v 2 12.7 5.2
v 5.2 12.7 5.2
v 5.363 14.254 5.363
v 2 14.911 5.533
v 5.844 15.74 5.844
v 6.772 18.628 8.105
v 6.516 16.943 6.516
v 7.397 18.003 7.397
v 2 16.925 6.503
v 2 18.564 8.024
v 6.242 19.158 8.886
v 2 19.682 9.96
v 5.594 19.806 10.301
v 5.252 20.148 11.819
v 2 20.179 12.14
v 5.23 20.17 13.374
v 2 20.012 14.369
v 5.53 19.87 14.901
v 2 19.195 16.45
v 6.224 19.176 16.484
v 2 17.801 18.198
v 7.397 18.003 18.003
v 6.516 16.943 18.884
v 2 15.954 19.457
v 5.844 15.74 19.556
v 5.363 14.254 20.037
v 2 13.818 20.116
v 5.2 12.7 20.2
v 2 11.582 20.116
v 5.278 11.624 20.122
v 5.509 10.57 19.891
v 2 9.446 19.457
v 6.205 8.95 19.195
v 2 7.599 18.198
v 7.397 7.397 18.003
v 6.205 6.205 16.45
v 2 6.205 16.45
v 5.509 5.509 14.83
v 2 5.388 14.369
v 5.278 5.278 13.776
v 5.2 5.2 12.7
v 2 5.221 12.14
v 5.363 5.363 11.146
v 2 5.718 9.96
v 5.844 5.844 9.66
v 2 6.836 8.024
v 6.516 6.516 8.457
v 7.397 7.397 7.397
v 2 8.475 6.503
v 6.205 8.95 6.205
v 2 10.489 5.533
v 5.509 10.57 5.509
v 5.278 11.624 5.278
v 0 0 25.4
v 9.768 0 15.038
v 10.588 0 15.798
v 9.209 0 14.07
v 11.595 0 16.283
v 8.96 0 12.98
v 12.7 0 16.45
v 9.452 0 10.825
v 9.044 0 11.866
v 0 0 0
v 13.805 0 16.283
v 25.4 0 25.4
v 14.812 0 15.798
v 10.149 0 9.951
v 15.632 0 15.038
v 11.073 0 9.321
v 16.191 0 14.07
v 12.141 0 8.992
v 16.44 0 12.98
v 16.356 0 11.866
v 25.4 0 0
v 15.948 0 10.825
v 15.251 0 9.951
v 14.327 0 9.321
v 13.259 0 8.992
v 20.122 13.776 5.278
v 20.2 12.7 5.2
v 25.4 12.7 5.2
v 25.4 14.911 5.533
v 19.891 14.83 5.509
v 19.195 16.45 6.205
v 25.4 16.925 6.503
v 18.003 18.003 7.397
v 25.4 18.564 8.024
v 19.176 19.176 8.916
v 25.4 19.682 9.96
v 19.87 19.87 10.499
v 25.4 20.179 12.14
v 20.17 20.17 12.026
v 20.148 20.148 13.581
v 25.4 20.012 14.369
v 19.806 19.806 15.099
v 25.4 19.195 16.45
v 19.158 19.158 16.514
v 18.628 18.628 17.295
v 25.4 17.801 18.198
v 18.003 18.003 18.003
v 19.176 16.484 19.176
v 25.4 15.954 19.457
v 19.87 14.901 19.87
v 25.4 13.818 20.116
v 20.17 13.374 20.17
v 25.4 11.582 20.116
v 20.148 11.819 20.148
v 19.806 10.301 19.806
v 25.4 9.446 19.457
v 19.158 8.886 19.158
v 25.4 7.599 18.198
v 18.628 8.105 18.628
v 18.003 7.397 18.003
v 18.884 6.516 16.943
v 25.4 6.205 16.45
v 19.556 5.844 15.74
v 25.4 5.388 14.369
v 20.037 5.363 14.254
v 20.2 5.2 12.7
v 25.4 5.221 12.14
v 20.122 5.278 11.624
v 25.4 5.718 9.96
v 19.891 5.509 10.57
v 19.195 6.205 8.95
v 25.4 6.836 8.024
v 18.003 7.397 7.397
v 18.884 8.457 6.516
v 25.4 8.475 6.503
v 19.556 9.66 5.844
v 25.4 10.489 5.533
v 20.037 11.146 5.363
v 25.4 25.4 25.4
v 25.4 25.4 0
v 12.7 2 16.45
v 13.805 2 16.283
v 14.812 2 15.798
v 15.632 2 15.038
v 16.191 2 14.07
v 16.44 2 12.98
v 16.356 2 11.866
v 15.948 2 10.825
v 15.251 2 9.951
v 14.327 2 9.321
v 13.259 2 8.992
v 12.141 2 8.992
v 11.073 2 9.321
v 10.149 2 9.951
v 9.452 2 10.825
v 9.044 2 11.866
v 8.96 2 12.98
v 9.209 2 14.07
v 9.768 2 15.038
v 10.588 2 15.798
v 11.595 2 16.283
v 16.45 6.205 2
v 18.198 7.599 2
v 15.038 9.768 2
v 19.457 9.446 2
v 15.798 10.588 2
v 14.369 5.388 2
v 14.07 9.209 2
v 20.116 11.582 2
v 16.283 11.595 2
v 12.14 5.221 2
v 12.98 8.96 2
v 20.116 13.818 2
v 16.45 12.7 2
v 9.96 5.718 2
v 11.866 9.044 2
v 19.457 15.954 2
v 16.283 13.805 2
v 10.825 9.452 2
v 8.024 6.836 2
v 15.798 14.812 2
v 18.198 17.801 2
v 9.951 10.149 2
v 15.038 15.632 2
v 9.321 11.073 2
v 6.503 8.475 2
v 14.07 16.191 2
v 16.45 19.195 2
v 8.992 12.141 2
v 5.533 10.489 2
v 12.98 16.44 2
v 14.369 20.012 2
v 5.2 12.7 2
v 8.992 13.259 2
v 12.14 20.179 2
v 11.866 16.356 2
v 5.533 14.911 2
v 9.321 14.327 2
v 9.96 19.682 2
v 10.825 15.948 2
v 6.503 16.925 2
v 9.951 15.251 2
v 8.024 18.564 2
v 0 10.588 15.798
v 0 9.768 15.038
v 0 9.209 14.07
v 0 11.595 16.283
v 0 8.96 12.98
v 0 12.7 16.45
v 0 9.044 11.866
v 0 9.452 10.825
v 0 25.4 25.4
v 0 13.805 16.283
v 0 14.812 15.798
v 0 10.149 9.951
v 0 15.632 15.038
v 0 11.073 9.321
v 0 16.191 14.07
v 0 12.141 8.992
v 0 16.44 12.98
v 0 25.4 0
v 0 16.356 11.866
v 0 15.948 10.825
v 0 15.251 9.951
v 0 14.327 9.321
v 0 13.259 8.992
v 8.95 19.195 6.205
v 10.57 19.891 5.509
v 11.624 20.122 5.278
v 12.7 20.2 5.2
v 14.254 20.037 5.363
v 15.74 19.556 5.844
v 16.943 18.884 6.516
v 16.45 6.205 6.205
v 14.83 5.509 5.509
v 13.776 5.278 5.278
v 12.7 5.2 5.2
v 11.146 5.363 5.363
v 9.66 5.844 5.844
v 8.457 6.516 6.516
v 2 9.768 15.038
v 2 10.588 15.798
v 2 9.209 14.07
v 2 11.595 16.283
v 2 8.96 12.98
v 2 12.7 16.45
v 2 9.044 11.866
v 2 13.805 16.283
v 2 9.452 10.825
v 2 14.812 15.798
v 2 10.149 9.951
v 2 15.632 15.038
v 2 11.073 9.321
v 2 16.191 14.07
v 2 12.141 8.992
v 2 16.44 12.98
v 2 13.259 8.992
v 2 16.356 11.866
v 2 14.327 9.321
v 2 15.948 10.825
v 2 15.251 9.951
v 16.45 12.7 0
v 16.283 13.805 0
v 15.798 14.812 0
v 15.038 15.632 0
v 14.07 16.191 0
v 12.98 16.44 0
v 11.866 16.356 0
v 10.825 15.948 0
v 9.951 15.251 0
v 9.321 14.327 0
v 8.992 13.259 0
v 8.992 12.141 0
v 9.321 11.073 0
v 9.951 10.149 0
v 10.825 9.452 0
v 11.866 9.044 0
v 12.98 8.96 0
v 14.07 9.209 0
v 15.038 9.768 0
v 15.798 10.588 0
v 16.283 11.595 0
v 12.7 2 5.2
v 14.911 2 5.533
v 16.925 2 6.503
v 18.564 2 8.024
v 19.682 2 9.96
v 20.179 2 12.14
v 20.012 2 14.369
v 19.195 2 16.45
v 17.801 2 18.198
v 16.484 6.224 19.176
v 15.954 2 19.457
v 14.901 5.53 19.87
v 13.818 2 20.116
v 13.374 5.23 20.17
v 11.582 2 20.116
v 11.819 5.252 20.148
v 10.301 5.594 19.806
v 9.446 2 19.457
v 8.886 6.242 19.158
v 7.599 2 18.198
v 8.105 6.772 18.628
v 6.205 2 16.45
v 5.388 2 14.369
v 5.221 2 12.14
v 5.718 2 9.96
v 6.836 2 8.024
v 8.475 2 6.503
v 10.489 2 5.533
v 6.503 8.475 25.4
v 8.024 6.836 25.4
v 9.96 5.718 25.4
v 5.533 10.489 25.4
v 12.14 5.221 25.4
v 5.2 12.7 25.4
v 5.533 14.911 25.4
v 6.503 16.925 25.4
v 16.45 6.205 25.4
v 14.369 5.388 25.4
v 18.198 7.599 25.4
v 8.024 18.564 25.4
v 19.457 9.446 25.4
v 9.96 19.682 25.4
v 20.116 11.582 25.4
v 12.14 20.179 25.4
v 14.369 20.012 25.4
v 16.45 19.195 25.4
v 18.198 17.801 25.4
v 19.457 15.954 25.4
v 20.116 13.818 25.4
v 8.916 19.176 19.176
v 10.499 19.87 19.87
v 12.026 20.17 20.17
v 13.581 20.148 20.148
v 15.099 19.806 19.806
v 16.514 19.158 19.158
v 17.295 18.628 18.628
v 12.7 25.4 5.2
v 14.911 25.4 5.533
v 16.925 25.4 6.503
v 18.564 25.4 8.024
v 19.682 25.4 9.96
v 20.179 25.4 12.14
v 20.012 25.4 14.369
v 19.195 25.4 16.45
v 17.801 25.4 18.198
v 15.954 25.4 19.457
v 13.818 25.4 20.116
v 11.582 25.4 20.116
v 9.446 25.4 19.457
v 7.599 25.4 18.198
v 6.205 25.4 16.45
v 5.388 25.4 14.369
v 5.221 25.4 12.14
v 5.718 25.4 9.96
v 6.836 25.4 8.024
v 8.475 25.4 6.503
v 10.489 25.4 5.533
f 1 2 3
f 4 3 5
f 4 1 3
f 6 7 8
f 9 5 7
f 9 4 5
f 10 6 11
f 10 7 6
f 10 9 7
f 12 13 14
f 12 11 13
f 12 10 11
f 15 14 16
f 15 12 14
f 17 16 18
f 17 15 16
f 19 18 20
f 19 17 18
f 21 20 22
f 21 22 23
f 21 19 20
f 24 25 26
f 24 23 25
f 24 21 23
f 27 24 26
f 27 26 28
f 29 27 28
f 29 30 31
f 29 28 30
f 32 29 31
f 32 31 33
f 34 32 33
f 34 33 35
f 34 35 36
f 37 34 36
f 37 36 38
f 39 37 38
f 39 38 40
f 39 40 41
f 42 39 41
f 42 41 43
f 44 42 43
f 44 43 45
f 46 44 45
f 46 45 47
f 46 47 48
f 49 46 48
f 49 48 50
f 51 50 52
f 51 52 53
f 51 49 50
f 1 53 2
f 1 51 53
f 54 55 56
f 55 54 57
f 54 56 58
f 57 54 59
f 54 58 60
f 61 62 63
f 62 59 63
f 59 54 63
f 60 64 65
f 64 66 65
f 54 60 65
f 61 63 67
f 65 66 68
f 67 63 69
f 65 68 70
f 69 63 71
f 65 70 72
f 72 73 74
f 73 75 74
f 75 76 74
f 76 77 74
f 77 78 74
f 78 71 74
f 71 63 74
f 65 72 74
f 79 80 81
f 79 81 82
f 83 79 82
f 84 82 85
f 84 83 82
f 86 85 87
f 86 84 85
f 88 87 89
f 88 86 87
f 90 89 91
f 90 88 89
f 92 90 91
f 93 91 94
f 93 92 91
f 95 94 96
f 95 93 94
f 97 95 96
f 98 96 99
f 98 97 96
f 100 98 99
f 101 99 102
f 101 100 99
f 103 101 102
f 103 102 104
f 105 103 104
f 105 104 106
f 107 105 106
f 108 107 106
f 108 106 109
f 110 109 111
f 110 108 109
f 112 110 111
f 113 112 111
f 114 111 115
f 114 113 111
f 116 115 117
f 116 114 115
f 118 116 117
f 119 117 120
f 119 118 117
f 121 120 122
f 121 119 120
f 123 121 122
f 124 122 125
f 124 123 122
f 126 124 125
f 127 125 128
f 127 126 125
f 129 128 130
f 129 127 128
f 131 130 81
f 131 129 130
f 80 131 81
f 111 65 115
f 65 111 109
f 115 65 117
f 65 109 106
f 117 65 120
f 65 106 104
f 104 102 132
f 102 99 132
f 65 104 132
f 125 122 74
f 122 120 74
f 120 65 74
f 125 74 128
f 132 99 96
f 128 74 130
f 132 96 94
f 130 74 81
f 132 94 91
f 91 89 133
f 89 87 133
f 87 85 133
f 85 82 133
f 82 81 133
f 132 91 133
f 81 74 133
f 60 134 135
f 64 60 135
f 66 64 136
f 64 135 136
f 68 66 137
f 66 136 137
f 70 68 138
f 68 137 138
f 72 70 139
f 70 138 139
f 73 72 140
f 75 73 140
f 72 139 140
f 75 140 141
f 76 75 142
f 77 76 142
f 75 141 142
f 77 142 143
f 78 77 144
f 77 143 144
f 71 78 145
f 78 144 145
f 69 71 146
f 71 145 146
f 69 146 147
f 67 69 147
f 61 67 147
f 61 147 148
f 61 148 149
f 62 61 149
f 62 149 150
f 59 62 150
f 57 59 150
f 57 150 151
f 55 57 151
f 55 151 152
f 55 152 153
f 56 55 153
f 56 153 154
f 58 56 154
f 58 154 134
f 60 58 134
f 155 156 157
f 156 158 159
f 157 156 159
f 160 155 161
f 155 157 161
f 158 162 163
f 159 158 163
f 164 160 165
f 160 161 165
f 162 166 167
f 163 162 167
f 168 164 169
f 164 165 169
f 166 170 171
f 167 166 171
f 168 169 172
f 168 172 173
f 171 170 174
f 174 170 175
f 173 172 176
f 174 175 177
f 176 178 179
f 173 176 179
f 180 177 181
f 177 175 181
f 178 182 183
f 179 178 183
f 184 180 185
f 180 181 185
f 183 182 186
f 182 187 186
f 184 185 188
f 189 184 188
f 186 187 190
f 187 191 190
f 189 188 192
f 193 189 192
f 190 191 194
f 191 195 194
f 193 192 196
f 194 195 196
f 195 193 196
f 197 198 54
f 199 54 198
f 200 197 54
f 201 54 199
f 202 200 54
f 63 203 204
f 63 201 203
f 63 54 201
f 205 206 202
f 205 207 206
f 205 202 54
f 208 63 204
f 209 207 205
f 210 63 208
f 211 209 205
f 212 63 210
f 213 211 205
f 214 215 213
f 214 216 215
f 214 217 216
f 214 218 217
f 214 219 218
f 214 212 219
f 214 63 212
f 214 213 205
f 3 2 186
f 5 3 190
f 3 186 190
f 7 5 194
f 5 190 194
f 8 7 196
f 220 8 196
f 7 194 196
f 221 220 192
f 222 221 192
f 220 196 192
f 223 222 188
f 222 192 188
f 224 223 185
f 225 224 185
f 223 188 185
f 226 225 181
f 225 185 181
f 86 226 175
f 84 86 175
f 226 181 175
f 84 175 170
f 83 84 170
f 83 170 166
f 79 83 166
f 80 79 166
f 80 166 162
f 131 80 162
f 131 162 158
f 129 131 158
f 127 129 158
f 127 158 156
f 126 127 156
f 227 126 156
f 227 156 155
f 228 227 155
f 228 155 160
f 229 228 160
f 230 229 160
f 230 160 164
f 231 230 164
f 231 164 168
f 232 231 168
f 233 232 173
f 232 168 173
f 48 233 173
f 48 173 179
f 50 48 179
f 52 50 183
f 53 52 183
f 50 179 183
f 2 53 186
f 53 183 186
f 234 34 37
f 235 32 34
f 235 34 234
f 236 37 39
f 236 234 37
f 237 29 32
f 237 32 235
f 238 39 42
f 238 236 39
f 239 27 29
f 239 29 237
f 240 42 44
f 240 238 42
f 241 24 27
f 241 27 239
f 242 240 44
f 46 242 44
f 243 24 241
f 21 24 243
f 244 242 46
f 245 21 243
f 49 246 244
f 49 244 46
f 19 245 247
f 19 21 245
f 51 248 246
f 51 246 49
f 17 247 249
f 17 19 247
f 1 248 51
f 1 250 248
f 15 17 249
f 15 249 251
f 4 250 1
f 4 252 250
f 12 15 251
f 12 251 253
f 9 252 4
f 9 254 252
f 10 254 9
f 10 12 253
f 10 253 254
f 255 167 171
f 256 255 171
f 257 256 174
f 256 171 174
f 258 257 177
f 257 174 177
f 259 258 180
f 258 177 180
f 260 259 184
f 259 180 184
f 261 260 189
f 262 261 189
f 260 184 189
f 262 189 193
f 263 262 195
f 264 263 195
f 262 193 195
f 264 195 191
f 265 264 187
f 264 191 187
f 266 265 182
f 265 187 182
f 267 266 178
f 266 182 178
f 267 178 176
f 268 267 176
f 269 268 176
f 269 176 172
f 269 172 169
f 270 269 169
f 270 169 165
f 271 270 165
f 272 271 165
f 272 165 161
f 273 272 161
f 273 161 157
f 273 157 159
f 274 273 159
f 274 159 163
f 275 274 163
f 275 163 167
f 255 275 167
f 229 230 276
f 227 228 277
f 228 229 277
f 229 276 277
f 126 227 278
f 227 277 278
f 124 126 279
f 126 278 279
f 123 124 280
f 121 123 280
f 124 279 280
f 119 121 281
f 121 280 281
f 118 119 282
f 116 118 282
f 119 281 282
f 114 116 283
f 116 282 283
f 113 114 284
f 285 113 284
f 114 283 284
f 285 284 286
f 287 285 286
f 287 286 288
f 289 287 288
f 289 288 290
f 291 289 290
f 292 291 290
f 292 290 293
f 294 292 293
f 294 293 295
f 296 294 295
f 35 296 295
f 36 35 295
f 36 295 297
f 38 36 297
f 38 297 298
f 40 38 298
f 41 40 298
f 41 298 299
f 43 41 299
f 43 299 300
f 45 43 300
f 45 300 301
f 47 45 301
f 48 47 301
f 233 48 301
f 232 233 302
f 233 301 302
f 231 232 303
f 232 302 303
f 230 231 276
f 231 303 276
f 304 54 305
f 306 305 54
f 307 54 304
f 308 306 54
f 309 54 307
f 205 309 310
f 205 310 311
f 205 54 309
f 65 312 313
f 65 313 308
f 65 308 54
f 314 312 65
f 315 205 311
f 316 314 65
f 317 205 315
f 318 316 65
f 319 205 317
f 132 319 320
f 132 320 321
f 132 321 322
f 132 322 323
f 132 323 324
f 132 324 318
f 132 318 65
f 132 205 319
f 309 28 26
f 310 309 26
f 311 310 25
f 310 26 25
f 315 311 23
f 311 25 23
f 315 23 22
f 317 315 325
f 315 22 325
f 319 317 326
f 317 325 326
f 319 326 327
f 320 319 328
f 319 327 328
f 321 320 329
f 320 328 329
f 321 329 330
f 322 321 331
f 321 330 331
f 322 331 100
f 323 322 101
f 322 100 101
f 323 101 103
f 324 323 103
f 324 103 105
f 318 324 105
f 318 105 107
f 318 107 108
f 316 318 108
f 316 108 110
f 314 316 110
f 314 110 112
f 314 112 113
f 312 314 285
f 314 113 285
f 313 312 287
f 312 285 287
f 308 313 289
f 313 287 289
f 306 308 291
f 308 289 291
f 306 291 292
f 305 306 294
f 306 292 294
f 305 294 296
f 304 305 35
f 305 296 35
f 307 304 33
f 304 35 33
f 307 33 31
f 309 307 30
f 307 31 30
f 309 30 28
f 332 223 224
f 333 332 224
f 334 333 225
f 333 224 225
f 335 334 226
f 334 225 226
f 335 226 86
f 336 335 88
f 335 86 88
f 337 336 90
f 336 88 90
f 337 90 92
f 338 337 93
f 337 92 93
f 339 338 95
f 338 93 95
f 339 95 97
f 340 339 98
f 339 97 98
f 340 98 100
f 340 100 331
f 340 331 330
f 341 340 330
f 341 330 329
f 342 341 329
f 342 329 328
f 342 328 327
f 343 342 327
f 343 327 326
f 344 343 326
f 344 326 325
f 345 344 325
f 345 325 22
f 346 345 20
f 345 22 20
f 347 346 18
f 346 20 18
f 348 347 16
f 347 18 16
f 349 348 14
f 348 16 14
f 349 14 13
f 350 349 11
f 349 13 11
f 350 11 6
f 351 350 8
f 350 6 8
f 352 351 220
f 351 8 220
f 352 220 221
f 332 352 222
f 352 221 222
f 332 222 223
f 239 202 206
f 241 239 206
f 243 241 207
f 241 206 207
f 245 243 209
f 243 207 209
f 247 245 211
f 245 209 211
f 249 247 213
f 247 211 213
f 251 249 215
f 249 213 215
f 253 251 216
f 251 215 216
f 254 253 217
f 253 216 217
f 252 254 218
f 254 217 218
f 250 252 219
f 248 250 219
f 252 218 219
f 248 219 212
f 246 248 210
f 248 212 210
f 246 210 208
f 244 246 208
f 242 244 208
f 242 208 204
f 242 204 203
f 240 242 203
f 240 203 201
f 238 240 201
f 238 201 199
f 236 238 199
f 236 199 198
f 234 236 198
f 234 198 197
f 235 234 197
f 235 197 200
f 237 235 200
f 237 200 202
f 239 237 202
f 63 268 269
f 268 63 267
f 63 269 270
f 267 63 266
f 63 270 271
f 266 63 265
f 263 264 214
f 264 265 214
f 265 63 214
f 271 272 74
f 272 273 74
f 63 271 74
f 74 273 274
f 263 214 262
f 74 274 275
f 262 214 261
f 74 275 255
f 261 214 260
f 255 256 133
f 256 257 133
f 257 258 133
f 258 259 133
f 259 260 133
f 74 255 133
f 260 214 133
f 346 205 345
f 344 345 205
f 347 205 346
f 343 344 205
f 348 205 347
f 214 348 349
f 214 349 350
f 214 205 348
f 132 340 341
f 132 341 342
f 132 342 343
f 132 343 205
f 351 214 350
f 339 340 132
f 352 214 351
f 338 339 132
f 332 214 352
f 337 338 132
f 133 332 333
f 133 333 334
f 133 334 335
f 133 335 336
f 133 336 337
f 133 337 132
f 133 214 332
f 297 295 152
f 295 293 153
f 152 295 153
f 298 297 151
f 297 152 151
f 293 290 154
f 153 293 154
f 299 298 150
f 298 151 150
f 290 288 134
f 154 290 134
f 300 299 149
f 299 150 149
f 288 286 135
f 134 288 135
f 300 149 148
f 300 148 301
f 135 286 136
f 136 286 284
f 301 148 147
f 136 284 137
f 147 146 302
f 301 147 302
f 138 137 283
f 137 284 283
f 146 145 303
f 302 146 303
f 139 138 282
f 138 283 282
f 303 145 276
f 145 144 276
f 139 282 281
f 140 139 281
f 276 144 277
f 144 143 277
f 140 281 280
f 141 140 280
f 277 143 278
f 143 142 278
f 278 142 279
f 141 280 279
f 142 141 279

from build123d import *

# Parameters (mm, degrees)
SKETCH1_W           = 25.4
SKETCH1_H           = 25.4
BOSS_EXTRUDE1_DEPTH = 25.4
CUT_EXTRUDE1_START  = -2
SKETCH2_R           = 7.5
CUT_EXTRUDE1_DEPTH  = 42.994090512
CUT_EXTRUDE3_START  = -2
SKETCH4_R           = 7.5
CUT_EXTRUDE3_DEPTH  = 42.994090512
SKETCH5_R           = 3.75
CUT_EXTRUDE4_DEPTH  = 43.87050268
SKETCH7_R           = 3.75
CUT_EXTRUDE6_DEPTH  = 43.87050268
SKETCH6_R           = 3.75
CUT_EXTRUDE7_DEPTH  = 10
CUT_EXTRUDE8_START  = 2
SKETCH3_R           = 7.5
CUT_EXTRUDE8_DEPTH  = 42.994090628


with BuildPart() as part:
    # Sketch1 → Boss-Extrude1 (new body)
    with BuildSketch(Plane.XY):
        with Locations((12.7, 12.7)):
            Rectangle(SKETCH1_W, SKETCH1_H)
    extrude(amount=BOSS_EXTRUDE1_DEPTH)

    # Sketch2 → Cut-Extrude1 (cut, through all)
    with BuildSketch(Plane(origin=(0, 0, 0), x_dir=(-1, 0, 0), z_dir=(0, 0, -1)).offset(CUT_EXTRUDE1_START)):
        with Locations((-12.7, 12.7)):
            Circle(SKETCH2_R)
    extrude(amount=-CUT_EXTRUDE1_DEPTH, mode=Mode.SUBTRACT)

    # Sketch4 → Cut-Extrude3 (cut, through all)
    with BuildSketch(Plane.XZ.offset(CUT_EXTRUDE3_START)):
        with Locations(Location((12.7, 12.7, 0), (0, 0, 270))):
            Circle(SKETCH4_R)
    extrude(amount=-CUT_EXTRUDE3_DEPTH, mode=Mode.SUBTRACT)

    # Sketch5 → Cut-Extrude4 (cut, through all)
    with BuildSketch(Plane(origin=(0, 2, 0), x_dir=(1, 0, 0), z_dir=(0, 1, 0))):
        with Locations(Location((12.7, -12.7, 0), (0, 0, 270))):
            Circle(SKETCH5_R)
    extrude(amount=-CUT_EXTRUDE4_DEPTH, mode=Mode.SUBTRACT)

    # Sketch7 → Cut-Extrude6 (cut, through all)
    with BuildSketch(Plane.XY.offset(2)):
        with Locations((12.7, 12.7)):
            Circle(SKETCH7_R)
    extrude(amount=-CUT_EXTRUDE6_DEPTH, mode=Mode.SUBTRACT)

    # Sketch6 → Cut-Extrude7 (cut)
    with BuildSketch(Plane.ZY):
        with Locations((12.7, 12.7)):
            Circle(SKETCH6_R)
    extrude(amount=-CUT_EXTRUDE7_DEPTH, mode=Mode.SUBTRACT)

    # Sketch3 → Cut-Extrude8 (cut, through all)
    with BuildSketch(Plane(origin=(0, 0, 0), x_dir=(0, 0, -1), z_dir=(1, 0, 0)).offset(CUT_EXTRUDE8_START)):
        with Locations((-12.7, 12.7)):
            Circle(SKETCH3_R)
    extrude(amount=CUT_EXTRUDE8_DEPTH, mode=Mode.SUBTRACT)


solid = part.part
